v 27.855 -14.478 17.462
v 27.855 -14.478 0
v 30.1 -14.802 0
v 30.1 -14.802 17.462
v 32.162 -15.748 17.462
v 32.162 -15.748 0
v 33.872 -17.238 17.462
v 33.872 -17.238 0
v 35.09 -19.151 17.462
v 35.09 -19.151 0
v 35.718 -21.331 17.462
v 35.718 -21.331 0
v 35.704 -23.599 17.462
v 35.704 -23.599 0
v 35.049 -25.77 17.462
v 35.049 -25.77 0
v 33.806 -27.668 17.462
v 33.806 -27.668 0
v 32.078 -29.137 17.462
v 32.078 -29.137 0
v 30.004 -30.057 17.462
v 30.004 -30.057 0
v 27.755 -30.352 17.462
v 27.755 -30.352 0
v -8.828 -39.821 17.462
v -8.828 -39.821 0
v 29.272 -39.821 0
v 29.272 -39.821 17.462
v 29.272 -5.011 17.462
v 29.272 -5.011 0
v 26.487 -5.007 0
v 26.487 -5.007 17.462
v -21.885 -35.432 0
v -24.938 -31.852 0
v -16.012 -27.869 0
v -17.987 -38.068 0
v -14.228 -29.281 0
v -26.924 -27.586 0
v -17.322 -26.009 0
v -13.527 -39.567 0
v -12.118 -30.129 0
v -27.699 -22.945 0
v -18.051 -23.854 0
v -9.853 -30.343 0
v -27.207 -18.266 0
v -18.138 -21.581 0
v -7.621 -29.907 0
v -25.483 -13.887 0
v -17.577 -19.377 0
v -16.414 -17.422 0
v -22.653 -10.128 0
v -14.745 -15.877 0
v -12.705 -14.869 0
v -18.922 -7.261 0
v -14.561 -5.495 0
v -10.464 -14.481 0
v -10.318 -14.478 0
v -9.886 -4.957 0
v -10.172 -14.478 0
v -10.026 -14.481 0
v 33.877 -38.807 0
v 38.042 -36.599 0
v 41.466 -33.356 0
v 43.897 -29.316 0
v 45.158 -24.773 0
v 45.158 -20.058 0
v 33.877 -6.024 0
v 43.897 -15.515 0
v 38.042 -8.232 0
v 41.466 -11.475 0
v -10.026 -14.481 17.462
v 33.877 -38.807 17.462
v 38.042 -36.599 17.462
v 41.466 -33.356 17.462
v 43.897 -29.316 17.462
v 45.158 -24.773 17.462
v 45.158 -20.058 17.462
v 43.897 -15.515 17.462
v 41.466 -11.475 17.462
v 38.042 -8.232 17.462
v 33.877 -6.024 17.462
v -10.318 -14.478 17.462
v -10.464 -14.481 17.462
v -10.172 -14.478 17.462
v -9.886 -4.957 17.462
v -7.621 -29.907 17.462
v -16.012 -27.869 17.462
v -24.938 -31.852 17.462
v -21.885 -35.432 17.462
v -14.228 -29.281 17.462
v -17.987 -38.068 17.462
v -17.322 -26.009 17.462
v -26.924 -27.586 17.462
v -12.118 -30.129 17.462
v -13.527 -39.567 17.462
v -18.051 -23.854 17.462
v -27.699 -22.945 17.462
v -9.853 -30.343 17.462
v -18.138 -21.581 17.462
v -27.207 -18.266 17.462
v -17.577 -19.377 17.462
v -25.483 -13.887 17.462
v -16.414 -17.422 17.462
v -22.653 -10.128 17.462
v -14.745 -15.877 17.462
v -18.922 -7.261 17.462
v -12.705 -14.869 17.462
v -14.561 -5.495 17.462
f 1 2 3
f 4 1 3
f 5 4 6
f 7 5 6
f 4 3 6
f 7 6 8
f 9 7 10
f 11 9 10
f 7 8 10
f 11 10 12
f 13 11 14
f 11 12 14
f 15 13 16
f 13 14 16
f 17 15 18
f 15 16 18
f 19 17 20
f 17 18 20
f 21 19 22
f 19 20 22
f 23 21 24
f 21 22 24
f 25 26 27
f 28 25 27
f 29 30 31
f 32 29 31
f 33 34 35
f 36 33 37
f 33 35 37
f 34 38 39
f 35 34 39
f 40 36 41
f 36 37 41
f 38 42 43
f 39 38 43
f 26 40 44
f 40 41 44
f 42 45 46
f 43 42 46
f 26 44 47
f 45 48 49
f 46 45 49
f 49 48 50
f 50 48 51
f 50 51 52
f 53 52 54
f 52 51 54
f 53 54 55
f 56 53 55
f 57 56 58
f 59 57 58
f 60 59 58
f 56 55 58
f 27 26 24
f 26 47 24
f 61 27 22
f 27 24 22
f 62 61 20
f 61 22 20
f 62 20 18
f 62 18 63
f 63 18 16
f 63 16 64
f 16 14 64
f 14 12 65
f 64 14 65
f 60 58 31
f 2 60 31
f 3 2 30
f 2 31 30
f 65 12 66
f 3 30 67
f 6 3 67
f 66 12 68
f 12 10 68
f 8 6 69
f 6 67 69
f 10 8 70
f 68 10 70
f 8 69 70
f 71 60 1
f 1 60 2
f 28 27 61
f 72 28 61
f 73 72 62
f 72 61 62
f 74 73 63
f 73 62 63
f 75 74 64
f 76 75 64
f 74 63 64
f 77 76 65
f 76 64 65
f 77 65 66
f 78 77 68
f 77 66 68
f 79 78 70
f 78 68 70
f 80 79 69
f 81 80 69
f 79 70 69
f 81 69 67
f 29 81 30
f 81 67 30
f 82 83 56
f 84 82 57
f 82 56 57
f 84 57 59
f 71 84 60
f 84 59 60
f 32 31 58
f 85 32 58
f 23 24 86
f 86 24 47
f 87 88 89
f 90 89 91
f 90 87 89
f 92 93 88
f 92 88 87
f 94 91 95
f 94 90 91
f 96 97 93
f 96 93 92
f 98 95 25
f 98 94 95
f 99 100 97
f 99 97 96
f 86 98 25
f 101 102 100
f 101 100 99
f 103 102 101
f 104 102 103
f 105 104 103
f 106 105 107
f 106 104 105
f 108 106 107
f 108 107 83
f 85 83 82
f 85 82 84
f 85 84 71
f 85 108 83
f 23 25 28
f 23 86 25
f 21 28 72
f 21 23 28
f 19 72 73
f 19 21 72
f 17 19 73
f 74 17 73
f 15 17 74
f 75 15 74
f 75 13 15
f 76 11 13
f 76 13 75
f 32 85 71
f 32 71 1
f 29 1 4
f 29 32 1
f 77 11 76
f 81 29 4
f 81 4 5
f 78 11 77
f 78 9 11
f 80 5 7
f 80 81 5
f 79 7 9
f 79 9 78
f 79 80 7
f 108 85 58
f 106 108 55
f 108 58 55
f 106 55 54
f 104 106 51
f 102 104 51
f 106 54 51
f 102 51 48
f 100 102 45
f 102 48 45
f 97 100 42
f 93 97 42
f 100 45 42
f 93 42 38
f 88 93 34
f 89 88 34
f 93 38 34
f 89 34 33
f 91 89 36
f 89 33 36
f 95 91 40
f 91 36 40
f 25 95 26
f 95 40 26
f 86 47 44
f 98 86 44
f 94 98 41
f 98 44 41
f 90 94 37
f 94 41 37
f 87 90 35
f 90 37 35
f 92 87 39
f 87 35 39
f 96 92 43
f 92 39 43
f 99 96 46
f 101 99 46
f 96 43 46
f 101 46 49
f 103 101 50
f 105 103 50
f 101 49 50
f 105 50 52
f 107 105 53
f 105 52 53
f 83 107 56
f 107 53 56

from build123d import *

# Parameters (mm, degrees)
F1_DEPTH = 17.4625


with BuildPart() as f1:
    # F0 (on Top) → F1 (new body)
    with BuildSketch(Plane.XY):
        with BuildLine():
            Line((-8.828322, -39.820505), (26.439151, -39.820505))
            Line((26.439151, -39.820505), (29.271678, -39.820505))
            ThreePointArc((29.271678, -39.820505), (45.317915, -22.415531), (29.271678, -5.010558))
            Line((29.271678, -5.010558), (26.487026, -5.006728))
            Line((26.487026, -5.006728), (-9.886203, -4.956709))
            ThreePointArc((-9.886203, -4.956709), (-27.699052, -22.945157), (-8.828322, -39.820505))
        make_face()
        with BuildLine():
            ThreePointArc((27.854786, -14.478031), (35.792759, -22.465207), (27.755437, -30.352402))
            Line((27.755437, -30.352402), (-7.620645, -29.906783))
            ThreePointArc((-7.620645, -29.906783), (-18.050575, -23.854432), (-10.464113, -14.481068))
            ThreePointArc((-10.464113, -14.481068), (-10.245214, -14.478031), (-10.026315, -14.481033))
            Line((-10.026315, -14.481033), (27.854786, -14.478031))
        make_face(mode=Mode.SUBTRACT)
    extrude(amount=F1_DEPTH)


solid = f1.part
